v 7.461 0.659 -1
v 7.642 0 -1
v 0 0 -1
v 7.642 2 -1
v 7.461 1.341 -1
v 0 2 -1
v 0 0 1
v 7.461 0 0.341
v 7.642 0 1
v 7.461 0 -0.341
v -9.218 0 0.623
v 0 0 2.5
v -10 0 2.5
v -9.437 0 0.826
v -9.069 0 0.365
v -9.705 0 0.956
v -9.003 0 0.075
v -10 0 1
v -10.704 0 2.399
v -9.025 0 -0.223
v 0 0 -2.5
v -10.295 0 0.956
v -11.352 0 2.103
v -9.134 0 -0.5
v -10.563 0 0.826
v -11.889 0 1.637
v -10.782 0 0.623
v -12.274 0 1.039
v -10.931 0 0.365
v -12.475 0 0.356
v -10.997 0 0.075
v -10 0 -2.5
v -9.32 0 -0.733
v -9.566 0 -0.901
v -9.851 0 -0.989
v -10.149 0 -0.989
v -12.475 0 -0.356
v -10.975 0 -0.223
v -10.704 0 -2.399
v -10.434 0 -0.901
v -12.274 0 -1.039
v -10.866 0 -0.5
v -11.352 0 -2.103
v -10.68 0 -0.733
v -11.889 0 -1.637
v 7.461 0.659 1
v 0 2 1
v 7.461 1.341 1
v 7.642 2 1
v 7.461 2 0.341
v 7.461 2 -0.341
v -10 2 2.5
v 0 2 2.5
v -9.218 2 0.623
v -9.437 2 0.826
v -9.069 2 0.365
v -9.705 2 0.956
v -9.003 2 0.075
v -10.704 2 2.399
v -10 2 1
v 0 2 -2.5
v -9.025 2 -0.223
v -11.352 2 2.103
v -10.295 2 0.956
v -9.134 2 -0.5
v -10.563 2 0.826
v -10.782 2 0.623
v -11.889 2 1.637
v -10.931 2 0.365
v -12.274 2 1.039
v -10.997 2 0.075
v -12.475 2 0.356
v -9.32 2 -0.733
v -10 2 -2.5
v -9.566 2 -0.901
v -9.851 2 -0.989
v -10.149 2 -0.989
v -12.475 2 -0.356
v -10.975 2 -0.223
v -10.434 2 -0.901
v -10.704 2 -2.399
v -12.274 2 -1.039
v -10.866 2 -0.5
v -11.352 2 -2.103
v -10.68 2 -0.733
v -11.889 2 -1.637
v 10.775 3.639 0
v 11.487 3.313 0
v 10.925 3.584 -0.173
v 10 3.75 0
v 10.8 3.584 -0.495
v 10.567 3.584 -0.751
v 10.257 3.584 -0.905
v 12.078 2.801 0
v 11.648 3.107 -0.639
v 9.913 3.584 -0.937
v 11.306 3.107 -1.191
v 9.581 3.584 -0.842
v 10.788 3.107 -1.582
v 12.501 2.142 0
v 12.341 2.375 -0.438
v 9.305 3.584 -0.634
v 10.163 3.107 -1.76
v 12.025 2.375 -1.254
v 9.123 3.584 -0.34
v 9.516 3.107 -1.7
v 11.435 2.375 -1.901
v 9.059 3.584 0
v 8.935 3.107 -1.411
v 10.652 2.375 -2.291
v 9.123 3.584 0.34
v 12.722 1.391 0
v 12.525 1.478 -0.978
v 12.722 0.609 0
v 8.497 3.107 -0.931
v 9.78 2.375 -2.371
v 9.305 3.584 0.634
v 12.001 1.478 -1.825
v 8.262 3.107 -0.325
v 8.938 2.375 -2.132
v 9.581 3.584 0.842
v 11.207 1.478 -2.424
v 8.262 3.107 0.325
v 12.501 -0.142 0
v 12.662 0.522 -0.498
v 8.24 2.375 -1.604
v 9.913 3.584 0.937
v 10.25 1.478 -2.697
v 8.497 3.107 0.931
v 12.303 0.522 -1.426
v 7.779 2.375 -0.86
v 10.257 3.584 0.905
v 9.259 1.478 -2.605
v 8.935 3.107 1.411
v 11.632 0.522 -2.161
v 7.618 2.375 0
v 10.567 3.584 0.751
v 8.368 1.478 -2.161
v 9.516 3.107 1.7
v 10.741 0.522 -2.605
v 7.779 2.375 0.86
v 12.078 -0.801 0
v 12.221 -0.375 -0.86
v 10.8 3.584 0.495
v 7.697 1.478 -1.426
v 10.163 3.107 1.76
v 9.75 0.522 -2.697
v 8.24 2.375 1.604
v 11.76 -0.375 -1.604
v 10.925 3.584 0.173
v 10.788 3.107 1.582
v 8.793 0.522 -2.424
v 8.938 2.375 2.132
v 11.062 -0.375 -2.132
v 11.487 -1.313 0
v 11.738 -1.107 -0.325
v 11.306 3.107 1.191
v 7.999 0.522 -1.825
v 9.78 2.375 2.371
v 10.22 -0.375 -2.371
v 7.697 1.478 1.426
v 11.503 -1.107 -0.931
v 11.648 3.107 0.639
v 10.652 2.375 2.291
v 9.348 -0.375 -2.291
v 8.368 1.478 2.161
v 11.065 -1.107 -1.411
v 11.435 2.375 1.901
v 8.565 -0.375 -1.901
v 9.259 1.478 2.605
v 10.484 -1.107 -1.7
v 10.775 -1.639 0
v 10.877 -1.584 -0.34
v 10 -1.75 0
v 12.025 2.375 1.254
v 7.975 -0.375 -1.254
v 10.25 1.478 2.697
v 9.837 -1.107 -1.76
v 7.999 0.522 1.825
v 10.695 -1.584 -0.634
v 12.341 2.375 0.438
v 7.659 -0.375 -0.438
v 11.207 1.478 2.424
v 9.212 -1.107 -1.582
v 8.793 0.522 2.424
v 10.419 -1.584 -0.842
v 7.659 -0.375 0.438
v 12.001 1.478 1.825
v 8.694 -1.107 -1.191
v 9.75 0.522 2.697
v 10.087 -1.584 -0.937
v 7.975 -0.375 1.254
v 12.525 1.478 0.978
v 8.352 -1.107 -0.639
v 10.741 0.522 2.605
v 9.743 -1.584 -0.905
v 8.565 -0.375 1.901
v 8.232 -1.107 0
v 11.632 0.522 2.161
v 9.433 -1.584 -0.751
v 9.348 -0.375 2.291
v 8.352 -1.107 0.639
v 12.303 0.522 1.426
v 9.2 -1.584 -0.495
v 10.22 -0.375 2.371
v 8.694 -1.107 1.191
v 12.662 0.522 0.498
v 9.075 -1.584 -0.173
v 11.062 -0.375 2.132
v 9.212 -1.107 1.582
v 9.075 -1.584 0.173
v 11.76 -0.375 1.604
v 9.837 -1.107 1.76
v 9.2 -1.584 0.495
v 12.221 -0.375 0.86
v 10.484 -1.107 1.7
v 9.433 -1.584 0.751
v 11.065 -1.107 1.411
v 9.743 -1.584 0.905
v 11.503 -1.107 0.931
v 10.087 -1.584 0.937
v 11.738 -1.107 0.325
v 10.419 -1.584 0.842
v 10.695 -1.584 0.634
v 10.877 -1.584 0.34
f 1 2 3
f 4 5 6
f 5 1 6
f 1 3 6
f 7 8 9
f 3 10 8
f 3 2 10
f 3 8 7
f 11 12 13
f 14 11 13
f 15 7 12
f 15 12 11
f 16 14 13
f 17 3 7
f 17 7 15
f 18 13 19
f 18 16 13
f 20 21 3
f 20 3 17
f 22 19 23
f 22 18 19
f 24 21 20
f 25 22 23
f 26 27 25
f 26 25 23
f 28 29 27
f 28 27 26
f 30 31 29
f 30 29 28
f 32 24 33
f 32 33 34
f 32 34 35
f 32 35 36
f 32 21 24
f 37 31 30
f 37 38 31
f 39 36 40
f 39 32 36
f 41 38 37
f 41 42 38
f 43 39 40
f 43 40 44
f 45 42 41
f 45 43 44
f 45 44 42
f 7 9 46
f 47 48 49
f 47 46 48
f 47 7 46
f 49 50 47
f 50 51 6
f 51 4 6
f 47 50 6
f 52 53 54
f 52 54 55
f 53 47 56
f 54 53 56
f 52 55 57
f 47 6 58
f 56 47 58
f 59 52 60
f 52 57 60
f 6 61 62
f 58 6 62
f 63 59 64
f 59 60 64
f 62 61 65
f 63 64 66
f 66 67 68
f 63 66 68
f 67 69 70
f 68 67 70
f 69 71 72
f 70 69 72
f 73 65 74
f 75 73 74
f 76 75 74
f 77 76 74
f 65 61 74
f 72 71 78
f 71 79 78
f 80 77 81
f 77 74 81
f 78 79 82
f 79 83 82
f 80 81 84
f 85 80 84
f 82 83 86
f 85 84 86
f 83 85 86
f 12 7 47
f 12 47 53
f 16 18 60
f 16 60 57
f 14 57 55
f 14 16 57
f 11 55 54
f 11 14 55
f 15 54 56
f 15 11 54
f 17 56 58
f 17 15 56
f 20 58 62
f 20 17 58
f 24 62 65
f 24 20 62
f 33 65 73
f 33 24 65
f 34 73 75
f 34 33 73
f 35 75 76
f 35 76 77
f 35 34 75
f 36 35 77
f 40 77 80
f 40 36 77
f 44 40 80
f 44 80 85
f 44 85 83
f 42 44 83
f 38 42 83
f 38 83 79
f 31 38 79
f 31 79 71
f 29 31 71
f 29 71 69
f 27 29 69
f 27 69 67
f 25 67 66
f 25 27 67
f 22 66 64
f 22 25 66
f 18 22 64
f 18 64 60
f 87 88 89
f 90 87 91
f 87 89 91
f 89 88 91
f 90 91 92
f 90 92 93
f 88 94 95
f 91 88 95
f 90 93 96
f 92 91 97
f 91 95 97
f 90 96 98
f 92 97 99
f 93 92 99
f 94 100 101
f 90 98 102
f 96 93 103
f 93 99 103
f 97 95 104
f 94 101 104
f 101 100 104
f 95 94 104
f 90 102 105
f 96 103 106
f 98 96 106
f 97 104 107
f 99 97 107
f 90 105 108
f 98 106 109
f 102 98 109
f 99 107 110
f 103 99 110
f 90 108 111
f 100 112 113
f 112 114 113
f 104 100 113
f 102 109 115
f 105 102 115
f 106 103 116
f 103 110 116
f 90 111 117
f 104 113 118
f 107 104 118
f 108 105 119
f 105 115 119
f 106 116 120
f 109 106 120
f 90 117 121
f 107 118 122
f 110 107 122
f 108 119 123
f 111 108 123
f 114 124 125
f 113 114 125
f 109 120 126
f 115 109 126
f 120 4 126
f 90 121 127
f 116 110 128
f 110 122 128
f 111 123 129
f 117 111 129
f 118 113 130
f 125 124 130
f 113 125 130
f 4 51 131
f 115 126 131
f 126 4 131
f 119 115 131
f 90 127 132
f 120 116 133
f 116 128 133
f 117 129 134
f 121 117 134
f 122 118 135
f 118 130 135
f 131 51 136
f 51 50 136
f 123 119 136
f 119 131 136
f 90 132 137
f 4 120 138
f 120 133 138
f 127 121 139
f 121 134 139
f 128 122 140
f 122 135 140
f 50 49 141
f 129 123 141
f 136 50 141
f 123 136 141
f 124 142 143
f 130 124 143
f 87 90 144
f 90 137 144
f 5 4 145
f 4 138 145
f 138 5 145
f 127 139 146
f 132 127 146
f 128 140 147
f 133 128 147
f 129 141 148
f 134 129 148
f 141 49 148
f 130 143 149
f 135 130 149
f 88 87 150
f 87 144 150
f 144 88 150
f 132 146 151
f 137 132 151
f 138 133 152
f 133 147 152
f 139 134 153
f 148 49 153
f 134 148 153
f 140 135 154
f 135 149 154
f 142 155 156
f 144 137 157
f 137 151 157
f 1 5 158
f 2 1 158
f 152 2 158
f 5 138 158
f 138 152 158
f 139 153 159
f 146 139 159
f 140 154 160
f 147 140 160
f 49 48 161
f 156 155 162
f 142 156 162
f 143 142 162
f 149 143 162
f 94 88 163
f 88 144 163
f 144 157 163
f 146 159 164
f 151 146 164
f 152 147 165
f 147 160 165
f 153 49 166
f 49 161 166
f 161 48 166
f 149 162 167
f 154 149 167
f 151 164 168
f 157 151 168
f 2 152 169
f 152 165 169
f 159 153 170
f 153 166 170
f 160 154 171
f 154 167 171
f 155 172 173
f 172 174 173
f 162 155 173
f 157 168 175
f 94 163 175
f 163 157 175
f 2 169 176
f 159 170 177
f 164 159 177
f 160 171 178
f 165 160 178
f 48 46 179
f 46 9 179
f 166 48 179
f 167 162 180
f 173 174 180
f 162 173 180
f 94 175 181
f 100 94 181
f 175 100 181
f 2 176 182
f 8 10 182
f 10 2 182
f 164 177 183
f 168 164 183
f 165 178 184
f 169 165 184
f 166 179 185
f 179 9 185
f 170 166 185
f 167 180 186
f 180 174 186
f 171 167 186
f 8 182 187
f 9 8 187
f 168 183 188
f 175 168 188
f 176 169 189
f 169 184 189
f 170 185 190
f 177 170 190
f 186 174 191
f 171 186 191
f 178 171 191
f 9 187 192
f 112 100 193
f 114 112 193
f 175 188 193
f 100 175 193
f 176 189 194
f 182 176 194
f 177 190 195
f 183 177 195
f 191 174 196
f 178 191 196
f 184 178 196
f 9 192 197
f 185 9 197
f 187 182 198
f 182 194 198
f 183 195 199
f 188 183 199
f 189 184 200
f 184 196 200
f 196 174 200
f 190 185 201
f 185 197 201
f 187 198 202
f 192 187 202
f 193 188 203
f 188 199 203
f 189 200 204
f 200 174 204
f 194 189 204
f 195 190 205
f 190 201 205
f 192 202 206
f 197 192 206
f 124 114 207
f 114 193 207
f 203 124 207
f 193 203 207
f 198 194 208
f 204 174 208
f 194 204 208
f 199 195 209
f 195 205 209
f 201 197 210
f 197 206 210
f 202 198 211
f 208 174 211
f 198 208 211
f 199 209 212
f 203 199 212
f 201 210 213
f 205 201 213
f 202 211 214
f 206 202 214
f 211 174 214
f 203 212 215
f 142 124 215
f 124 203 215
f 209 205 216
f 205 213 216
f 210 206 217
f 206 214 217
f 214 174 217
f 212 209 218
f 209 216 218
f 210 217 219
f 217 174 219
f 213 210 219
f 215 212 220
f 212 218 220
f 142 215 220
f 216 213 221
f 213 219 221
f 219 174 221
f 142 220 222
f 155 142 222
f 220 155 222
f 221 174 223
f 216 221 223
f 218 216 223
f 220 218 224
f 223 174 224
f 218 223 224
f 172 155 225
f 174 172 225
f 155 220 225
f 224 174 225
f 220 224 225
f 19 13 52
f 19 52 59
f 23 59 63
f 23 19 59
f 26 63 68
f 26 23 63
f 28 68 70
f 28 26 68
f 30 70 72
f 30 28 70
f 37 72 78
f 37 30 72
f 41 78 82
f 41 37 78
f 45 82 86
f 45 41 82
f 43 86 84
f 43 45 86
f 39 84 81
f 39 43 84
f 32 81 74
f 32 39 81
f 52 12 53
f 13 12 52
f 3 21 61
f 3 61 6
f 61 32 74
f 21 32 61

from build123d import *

# Parameters (mm, degrees)
SKETCH1_R               = 1
BOSS_EXTRUDE1_DEPTH     = 2
SKETCH4_W               = 2
SKETCH4_H               = 2
BOSS_EXTRUDE2_DEPTH     = 11
CUT_EXTRUDE1_DEPTH      = 13.903487901
CUT_EXTRUDE1_DEPTH_BACK = 13.903487901
CUT_EXTRUDE2_DEPTH      = 14.133925537
CUT_EXTRUDE2_DEPTH_BACK = 14.133925537
CUT_EXTRUDE3_DEPTH      = 14.133925537
CUT_EXTRUDE3_DEPTH_BACK = 14.133925537
SKETCH7_R               = 0.5


with BuildPart() as part:
    # Sketch1 → Boss-Extrude1 (new body)
    with BuildSketch(Plane(origin=(0, 0, 0), x_dir=(1, 0, 0), z_dir=(0, 1, 0))):
        with BuildLine():
            Line((-10, 2.5), (0, 2.5))
            Line((0, 2.5), (0, -2.5))
            Line((0, -2.5), (-10, -2.5))
            ThreePointArc((-10, -2.5), (-12.5, 0), (-10, 2.5))
        make_face()
        with Locations(Location((-10, 0, 0), (0, 0, 270))):
            Circle(SKETCH1_R, mode=Mode.SUBTRACT)
    extrude(amount=BOSS_EXTRUDE1_DEPTH)

    # Sketch4 → Boss-Extrude2 (add)
    with BuildSketch(Plane(origin=(0, 0, 0), x_dir=(0, 0, -1), z_dir=(1, 0, 0))):
        with Locations((0, 1)):
            Rectangle(SKETCH4_W, SKETCH4_H)
    extrude(amount=BOSS_EXTRUDE2_DEPTH)

    # Sketch5 → Cut-Extrude1 (cut, two sides: drawn at the far end of the back side and taken through both)
    with BuildSketch(Plane(origin=(0, 2, 0), x_dir=(1, 0, 0), z_dir=(0, 1, 0)).offset(-CUT_EXTRUDE1_DEPTH_BACK)):
        with BuildLine():
            Line((10, 1), (10, 1.5))
            Line((10, 1.5), (12, 1.5))
            Line((12, 1.5), (12, -1.5))
            Line((12, -1.5), (10, -1.5))
            Line((10, -1.5), (10, -1))
            ThreePointArc((10, -1), (11, 0), (10, 1))
        make_face()
    extrude(amount=CUT_EXTRUDE1_DEPTH + CUT_EXTRUDE1_DEPTH_BACK, mode=Mode.SUBTRACT)

    # Sketch6 → Cut-Extrude2 (cut, two sides: drawn at the far end of the back side and taken through both)
    with BuildSketch(Plane(origin=(0, 0, -1), x_dir=(-1, 0, 0), z_dir=(0, 0, -1)).offset(-CUT_EXTRUDE2_DEPTH_BACK)):
        with BuildLine():
            Line((-10, 2), (-10, 2.5))
            Line((-10, 2.5), (-12, 2.5))
            Line((-12, 2.5), (-12, -0.5))
            Line((-12, -0.5), (-10, -0.5))
            Line((-10, -0.5), (-10, 0))
            ThreePointArc((-10, 0), (-11, 1), (-10, 2))
        make_face()
    extrude(amount=CUT_EXTRUDE2_DEPTH + CUT_EXTRUDE2_DEPTH_BACK, mode=Mode.SUBTRACT)

    # Sketch7 → Cut-Extrude3 (cut, two sides: drawn at the far end of the back side and taken through both)
    with BuildSketch(Plane(origin=(0, 0, -1), x_dir=(-1, 0, 0), z_dir=(0, 0, -1)).offset(-CUT_EXTRUDE3_DEPTH_BACK)):
        with Locations(Location((-10, 1, 0), (0, 0, 90))):
            Circle(SKETCH7_R)
    extrude(amount=CUT_EXTRUDE3_DEPTH + CUT_EXTRUDE3_DEPTH_BACK, mode=Mode.SUBTRACT)

    # Sketch10 → Revolve1 (revolve)
    with BuildSketch(Plane.XY):
        with BuildLine():
            ThreePointArc((10, 3.75), (12.75, 1), (10, -1.75))
            Line((10, -1.75), (10, 1))
            Line((10, 1), (10, 3.75))
        make_face()
    revolve(axis=Axis((10, 1, 0), (0, 1, 0)))


solid = part.part
